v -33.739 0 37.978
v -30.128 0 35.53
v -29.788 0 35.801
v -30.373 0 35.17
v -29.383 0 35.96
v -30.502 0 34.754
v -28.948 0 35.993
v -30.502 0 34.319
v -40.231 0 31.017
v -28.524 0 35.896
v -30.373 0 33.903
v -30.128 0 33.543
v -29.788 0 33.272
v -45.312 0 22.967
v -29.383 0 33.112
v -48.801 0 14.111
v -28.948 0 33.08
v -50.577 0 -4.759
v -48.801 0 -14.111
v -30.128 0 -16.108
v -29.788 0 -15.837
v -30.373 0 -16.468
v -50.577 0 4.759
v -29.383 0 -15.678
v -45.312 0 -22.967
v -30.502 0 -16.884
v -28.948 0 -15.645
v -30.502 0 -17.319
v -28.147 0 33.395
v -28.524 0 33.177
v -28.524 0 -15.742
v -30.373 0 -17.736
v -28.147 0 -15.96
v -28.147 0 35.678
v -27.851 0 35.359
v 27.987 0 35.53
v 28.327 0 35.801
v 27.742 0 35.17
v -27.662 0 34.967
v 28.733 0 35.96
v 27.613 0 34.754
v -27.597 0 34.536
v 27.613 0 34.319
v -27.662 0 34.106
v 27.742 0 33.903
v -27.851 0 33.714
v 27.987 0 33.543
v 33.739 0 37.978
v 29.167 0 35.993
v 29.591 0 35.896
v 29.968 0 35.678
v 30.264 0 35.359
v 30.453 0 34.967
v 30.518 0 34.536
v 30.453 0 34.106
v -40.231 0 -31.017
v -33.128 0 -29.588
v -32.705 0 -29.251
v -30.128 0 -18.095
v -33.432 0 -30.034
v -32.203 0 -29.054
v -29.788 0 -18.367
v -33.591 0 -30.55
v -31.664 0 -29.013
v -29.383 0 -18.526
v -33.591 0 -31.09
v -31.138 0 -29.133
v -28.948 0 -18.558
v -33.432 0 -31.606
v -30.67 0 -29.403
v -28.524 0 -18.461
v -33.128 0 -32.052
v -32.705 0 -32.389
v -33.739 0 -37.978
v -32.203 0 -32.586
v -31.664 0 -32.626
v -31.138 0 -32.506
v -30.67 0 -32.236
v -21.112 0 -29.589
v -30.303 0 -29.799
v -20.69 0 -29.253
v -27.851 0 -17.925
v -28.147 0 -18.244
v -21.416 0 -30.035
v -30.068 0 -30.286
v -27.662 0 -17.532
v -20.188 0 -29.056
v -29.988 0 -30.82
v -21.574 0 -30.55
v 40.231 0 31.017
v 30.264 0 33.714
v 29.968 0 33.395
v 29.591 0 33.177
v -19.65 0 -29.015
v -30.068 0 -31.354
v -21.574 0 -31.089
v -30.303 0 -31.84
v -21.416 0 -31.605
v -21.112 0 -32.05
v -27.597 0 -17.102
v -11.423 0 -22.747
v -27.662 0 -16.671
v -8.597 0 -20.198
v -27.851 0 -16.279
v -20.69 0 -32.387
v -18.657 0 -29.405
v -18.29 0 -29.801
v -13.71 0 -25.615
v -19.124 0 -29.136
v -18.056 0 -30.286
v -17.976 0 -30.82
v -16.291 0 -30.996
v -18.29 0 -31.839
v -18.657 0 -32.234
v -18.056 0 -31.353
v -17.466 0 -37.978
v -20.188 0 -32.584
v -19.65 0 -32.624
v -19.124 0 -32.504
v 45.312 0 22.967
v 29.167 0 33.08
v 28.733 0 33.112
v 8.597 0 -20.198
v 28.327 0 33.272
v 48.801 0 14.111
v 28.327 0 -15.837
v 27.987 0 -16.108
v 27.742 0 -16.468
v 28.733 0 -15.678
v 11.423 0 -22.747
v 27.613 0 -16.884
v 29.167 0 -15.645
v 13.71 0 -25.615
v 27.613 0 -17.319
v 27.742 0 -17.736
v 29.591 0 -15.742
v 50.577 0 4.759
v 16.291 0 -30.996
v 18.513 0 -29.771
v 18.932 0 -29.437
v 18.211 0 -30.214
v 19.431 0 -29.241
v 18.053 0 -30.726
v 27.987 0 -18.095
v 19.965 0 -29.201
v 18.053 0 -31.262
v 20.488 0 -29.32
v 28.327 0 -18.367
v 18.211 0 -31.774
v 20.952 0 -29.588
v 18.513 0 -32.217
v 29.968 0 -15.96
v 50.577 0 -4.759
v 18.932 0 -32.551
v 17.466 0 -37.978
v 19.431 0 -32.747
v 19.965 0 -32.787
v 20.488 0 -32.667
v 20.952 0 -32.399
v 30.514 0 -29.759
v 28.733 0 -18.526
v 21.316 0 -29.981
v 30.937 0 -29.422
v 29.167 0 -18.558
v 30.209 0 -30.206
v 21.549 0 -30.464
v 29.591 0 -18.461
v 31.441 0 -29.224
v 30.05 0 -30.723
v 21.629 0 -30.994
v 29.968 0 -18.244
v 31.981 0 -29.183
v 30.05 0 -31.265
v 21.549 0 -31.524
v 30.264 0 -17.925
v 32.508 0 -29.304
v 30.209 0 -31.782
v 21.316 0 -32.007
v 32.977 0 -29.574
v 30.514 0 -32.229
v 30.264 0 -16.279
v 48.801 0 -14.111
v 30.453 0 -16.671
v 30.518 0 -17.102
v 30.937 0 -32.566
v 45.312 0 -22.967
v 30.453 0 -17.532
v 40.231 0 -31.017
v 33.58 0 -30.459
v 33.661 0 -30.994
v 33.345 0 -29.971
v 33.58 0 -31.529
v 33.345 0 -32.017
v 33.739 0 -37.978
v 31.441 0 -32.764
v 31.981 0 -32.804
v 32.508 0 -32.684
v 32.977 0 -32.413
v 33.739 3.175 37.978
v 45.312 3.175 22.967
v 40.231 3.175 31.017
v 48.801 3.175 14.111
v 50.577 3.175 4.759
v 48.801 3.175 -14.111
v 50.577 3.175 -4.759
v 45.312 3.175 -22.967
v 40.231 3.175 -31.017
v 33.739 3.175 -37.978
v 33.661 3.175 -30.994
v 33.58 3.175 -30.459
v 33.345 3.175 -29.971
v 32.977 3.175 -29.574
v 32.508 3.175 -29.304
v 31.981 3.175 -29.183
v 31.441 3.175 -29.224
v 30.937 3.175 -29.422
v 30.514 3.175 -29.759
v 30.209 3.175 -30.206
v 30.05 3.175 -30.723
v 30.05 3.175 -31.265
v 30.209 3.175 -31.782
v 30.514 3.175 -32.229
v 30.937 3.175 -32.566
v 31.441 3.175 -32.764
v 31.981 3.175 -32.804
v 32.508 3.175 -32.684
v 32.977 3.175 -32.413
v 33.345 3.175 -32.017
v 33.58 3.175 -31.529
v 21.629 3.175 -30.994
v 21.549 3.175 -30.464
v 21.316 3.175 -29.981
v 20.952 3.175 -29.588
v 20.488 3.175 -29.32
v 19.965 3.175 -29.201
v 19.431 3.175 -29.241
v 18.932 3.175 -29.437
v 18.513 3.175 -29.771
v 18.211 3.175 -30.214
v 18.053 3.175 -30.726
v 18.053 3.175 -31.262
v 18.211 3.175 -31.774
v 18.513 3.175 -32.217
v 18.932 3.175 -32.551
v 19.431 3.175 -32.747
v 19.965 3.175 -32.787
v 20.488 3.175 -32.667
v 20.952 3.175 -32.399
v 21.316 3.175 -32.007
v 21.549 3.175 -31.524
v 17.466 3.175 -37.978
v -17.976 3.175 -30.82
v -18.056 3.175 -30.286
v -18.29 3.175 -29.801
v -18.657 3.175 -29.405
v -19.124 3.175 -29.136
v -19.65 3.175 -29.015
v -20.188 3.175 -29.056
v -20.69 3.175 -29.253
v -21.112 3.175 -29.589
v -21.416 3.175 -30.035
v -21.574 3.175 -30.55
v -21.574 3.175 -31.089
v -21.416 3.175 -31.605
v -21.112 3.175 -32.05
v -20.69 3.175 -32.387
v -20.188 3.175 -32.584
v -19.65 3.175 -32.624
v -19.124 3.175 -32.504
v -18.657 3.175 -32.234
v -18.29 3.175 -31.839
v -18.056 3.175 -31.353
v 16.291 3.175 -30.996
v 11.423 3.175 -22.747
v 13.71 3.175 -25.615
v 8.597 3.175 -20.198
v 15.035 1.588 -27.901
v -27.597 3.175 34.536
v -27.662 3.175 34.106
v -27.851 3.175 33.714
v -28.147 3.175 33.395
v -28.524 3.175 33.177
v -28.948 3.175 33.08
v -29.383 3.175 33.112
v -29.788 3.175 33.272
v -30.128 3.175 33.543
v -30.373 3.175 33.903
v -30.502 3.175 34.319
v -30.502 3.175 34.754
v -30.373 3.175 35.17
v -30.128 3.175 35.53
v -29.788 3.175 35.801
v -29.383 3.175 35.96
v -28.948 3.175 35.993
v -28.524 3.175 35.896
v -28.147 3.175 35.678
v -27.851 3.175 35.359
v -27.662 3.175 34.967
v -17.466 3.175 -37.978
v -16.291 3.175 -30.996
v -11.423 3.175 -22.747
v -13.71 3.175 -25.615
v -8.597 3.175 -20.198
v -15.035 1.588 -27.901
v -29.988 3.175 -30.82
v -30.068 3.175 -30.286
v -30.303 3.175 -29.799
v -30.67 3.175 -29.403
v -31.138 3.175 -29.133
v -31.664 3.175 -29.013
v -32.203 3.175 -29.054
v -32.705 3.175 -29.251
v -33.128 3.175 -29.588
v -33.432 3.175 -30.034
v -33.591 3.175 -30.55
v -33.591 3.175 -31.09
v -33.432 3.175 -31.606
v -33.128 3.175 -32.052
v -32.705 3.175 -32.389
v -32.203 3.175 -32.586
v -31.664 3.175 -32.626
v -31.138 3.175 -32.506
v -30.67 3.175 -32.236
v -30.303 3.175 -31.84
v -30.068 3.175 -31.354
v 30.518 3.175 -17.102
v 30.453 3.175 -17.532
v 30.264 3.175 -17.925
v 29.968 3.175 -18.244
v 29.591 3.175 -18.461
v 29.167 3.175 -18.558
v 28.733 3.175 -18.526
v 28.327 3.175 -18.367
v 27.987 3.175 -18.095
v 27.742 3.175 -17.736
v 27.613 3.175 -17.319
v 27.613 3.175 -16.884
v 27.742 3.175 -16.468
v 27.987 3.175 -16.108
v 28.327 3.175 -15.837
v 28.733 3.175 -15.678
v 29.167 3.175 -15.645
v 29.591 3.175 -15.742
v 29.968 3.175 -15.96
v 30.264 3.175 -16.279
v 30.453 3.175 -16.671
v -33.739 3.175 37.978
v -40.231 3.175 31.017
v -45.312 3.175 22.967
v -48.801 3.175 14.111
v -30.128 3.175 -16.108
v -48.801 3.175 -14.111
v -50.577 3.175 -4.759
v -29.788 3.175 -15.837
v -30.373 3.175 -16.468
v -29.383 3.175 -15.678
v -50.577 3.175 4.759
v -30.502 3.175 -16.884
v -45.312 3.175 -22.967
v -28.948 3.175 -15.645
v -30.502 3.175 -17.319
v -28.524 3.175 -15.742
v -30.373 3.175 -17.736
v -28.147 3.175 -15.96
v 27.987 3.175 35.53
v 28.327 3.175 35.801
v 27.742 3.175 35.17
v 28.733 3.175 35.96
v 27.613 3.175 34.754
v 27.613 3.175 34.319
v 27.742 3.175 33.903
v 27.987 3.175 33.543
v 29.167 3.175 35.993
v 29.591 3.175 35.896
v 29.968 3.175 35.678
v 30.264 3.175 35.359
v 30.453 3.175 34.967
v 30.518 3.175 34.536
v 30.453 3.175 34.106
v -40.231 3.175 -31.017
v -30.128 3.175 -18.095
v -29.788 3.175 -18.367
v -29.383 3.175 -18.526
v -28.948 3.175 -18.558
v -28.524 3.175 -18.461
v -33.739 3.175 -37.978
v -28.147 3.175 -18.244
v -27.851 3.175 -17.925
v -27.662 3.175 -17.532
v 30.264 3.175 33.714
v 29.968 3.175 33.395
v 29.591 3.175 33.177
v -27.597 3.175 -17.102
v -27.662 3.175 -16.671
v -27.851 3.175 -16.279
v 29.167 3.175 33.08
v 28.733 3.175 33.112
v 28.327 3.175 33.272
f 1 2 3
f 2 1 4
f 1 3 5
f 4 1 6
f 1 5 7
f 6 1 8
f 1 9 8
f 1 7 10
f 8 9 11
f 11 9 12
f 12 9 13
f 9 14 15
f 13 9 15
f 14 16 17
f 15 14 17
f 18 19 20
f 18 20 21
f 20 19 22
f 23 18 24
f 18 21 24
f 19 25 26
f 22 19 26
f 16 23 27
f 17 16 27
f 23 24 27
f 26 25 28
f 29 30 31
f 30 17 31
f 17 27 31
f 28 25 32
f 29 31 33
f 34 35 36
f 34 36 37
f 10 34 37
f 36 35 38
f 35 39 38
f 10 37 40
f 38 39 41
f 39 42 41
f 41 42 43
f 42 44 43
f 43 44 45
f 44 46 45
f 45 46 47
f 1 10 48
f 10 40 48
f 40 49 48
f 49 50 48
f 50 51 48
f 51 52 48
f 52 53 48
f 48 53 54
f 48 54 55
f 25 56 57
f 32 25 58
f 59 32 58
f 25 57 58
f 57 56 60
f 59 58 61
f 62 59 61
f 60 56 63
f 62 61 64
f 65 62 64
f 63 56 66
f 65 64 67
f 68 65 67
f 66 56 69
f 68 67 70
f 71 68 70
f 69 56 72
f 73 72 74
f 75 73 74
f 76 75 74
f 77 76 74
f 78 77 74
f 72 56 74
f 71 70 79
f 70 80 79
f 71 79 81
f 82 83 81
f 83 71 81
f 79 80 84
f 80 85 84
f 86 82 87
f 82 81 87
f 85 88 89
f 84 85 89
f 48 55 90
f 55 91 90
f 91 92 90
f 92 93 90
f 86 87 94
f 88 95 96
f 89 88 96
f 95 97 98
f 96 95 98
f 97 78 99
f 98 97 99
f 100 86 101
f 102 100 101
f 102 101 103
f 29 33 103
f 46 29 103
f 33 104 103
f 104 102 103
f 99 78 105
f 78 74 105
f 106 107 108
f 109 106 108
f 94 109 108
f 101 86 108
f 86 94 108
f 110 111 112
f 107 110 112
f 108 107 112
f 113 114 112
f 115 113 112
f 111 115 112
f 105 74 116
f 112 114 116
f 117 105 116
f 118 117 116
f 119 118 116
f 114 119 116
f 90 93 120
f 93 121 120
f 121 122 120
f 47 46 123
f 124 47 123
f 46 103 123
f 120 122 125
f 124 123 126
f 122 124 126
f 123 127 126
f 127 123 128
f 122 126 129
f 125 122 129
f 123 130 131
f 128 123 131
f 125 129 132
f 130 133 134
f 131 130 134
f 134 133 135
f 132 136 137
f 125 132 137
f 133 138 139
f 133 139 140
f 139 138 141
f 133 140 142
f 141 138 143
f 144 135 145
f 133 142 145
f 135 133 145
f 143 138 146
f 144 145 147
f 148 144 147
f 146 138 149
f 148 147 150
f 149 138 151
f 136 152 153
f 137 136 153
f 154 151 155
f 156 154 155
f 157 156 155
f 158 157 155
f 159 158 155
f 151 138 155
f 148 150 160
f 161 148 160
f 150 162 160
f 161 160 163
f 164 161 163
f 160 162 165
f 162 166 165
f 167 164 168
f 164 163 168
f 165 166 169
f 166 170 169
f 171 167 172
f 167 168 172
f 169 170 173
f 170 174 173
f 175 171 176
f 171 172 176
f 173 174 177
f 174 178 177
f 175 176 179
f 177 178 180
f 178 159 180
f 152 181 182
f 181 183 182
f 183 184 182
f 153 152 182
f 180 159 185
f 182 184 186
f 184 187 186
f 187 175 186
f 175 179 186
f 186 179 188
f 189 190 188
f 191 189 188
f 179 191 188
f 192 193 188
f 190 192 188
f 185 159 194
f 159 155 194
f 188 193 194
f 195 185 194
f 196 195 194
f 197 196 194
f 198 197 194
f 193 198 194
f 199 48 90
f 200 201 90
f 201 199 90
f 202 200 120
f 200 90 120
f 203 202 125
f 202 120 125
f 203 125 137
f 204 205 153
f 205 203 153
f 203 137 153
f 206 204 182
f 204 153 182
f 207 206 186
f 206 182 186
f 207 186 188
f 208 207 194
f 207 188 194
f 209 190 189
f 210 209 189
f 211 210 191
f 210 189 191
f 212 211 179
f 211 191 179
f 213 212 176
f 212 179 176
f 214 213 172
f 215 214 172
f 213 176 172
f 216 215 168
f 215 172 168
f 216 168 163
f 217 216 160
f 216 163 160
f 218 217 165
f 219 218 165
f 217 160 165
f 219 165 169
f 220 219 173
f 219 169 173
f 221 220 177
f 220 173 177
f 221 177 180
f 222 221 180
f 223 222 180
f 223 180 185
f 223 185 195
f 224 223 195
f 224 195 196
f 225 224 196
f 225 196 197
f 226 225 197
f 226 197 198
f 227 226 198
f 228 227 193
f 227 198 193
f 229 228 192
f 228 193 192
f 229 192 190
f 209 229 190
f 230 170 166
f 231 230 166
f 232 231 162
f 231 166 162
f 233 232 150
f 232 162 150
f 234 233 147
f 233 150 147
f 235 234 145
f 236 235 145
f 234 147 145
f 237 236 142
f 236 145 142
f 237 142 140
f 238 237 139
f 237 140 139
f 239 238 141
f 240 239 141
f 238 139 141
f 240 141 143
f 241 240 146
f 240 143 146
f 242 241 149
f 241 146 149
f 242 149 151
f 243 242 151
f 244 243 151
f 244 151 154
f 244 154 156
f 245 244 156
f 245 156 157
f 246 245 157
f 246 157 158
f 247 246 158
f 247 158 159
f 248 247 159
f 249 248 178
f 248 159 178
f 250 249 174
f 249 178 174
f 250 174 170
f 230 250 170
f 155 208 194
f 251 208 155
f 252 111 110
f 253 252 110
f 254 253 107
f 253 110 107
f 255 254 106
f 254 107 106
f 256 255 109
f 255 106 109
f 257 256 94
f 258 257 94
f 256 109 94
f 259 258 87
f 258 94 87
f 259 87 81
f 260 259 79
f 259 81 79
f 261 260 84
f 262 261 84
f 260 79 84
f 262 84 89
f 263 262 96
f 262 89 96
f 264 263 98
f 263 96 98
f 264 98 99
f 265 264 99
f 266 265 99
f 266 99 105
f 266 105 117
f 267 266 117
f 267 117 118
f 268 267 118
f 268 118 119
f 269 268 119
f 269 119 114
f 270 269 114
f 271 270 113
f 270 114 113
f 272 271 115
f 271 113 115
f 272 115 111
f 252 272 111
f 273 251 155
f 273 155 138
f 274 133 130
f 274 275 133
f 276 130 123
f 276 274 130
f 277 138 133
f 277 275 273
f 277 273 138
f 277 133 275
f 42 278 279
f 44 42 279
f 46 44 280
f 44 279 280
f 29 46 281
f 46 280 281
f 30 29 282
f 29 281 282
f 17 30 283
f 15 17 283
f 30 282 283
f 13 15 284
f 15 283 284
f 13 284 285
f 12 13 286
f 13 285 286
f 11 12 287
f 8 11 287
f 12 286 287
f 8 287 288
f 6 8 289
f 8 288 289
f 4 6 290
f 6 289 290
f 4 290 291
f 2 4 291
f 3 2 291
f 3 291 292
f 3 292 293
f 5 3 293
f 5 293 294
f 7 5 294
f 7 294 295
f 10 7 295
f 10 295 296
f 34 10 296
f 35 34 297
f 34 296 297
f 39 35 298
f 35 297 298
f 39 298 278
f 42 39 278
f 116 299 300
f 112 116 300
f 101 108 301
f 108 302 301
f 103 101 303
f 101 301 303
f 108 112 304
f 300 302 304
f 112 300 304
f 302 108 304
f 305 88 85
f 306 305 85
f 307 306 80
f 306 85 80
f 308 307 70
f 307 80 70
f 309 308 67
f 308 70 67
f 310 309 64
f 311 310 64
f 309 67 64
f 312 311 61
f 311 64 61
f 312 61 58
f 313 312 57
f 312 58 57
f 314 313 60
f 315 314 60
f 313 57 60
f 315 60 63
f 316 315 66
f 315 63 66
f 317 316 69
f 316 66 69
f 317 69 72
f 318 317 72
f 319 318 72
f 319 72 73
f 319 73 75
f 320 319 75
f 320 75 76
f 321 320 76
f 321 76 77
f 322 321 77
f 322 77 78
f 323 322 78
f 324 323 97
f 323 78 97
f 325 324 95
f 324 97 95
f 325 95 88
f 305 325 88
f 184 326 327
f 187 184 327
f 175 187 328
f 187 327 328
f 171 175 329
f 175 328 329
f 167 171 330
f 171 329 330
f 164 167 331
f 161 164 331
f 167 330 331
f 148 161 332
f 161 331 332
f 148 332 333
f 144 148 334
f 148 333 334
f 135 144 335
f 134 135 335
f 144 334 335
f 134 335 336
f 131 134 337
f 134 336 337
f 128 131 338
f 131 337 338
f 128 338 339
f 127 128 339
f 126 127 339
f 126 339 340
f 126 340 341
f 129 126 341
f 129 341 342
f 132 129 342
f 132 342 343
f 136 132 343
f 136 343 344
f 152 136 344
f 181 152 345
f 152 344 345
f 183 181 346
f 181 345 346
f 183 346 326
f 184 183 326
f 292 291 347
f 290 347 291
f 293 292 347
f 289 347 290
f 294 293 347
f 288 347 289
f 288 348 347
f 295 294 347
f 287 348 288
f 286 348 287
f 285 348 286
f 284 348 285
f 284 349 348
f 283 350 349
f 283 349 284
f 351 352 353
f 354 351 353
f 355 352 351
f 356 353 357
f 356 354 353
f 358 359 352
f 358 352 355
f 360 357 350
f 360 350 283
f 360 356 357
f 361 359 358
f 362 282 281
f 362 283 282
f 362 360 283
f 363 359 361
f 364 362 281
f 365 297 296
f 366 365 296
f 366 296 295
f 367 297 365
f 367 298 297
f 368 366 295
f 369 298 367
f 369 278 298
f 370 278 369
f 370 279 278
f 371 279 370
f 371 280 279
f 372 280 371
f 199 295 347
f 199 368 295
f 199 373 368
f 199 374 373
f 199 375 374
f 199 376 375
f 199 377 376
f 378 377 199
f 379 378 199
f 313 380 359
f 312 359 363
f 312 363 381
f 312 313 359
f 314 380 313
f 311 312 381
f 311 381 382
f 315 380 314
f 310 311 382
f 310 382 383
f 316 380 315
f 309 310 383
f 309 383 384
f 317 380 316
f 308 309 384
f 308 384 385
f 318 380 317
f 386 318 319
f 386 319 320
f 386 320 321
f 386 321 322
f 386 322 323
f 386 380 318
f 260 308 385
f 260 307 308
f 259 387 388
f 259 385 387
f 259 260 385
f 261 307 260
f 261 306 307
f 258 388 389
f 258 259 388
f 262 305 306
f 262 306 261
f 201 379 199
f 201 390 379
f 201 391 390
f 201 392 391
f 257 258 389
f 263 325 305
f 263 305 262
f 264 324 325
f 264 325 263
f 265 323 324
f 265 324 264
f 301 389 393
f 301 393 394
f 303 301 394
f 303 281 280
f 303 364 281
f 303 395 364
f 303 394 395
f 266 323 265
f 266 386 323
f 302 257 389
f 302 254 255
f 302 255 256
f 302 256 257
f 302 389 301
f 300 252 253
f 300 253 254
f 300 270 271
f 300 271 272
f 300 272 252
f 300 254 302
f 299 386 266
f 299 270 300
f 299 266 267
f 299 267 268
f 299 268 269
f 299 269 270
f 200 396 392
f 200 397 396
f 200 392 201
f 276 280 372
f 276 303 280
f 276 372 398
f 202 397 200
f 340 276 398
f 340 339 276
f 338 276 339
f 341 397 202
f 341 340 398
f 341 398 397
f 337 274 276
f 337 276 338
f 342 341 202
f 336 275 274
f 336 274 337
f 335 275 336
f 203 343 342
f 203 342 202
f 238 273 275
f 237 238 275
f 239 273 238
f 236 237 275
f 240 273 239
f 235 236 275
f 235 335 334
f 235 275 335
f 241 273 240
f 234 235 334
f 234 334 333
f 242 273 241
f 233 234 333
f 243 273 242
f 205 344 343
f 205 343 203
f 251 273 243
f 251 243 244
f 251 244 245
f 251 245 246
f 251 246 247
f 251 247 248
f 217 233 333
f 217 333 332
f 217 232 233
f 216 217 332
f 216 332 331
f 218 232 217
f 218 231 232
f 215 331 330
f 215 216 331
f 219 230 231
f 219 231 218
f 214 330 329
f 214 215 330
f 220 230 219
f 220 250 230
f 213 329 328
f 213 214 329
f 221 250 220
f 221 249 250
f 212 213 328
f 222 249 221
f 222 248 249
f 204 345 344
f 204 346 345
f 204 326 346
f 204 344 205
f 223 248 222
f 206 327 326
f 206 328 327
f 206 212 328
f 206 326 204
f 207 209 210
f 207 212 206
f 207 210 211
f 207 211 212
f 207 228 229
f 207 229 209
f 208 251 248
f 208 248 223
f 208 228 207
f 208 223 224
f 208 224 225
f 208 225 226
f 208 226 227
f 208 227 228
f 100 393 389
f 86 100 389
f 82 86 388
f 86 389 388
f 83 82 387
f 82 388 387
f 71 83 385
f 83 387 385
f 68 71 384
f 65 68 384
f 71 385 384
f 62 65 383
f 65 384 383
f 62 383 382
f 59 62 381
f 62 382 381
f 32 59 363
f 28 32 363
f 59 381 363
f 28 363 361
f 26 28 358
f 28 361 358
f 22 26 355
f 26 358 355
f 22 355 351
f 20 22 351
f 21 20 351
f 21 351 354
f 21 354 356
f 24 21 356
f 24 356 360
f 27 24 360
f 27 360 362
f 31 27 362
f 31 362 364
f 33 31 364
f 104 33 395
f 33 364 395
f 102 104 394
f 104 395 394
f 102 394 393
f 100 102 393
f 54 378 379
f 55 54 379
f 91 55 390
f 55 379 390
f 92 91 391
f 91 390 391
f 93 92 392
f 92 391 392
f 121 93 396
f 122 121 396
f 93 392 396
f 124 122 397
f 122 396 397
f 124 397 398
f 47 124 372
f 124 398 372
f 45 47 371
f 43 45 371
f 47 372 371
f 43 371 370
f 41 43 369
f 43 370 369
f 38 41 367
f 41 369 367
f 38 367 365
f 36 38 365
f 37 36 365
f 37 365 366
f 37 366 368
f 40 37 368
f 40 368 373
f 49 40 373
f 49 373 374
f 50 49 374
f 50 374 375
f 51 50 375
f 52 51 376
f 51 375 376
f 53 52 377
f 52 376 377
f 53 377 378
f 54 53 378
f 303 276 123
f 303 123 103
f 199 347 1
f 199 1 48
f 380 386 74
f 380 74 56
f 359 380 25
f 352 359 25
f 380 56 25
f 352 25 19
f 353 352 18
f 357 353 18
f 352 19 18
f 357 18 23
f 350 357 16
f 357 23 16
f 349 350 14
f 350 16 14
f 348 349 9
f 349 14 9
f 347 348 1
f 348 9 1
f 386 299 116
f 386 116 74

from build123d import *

# Parameters (mm, degrees)
SKETCH1_R           = 50.8
BOSS_EXTRUDE1_DEPTH = 3.175
SKETCH2_W           = 114.887790664
SKETCH2_H           = 17.737062418
CUT_EXTRUDE1_DEPTH  = 3.175
SKETCH6_R           = 1.4605
CUT_EXTRUDE2_DEPTH  = 3.175
SKETCH8_R           = 1.81159506
SKETCH8_R_2         = 1.809329071
SKETCH8_R_3         = 1.797728754
SKETCH8_R_4         = 1.815627059
CUT_EXTRUDE4_DEPTH  = 3.175


with BuildPart() as part:
    # Sketch1 → Boss-Extrude1 (new body)
    with BuildSketch(Plane(origin=(0, 0, 0), x_dir=(1, 0, 0), z_dir=(0, 1, 0))):
        Circle(SKETCH1_R)
    extrude(amount=BOSS_EXTRUDE1_DEPTH)

    # Sketch2 → Cut-Extrude1 (cut)
    with BuildSketch(Plane(origin=(0, 3.175, 0), x_dir=(1, 0, 0), z_dir=(0, 1, 0))):
        with BuildLine():
            Line((-53.141111112, 55.715142418), (61.746679552, 55.715142418))
            Line((61.746679552, 55.715142418), (61.746679552, 37.97808))
            Line((61.746679552, 37.97808), (17.466405486, 37.97808))
            add(Edge.make_bspline(
                [(17.466405486, 37.97808), (17.038082166, 26.714286782), (8.597103322, 20.19808)],
                knots=[0, 0, 0, 1, 1, 1], degree=2))
            Line((8.597103322, 20.19808), (-8.597103322, 20.19808))
            add(Edge.make_bspline(
                [(-17.466405486, 37.97808), (-17.038082166, 26.714286782), (-8.597103322, 20.19808)],
                knots=[0, 0, 0, 1, 1, 1], degree=2))
            Line((-17.466405486, 37.97808), (-53.141111112, 37.97808))
            Line((-53.141111112, 37.97808), (-53.141111112, 55.715142418))
        make_face()
        with Locations((4.30278422, -46.846611209)):
            Rectangle(SKETCH2_W, SKETCH2_H)
    extrude(amount=-CUT_EXTRUDE1_DEPTH, mode=Mode.SUBTRACT)

    # Sketch6 → Cut-Extrude2 (cut)
    with BuildSketch(Plane(origin=(0, 3.175, 0), x_dir=(1, 0, 0), z_dir=(0, 1, 0))):
        with Locations((-29.0576, 17.10182)):
            Circle(SKETCH6_R)
        with Locations((29.0576, 17.10182)):
            Circle(SKETCH6_R)
        with Locations((29.0576, -34.53638)):
            Circle(SKETCH6_R)
        with Locations((-29.0576, -34.53638)):
            Circle(SKETCH6_R)
    extrude(amount=-CUT_EXTRUDE2_DEPTH, mode=Mode.SUBTRACT)

    # Sketch8 → Cut-Extrude4 (cut)
    with BuildSketch(Plane.XZ):
        with Locations((-31.799566939, -30.819765523)):
            Circle(SKETCH8_R)
        with Locations((-19.785366939, -30.819765523)):
            Circle(SKETCH8_R_2)
        with Locations((19.830913185, -30.993944368)):
            Circle(SKETCH8_R_3)
        with Locations((31.845113185, -30.993944368)):
            Circle(SKETCH8_R_4)
    extrude(amount=-CUT_EXTRUDE4_DEPTH, mode=Mode.SUBTRACT)


solid = part.part
